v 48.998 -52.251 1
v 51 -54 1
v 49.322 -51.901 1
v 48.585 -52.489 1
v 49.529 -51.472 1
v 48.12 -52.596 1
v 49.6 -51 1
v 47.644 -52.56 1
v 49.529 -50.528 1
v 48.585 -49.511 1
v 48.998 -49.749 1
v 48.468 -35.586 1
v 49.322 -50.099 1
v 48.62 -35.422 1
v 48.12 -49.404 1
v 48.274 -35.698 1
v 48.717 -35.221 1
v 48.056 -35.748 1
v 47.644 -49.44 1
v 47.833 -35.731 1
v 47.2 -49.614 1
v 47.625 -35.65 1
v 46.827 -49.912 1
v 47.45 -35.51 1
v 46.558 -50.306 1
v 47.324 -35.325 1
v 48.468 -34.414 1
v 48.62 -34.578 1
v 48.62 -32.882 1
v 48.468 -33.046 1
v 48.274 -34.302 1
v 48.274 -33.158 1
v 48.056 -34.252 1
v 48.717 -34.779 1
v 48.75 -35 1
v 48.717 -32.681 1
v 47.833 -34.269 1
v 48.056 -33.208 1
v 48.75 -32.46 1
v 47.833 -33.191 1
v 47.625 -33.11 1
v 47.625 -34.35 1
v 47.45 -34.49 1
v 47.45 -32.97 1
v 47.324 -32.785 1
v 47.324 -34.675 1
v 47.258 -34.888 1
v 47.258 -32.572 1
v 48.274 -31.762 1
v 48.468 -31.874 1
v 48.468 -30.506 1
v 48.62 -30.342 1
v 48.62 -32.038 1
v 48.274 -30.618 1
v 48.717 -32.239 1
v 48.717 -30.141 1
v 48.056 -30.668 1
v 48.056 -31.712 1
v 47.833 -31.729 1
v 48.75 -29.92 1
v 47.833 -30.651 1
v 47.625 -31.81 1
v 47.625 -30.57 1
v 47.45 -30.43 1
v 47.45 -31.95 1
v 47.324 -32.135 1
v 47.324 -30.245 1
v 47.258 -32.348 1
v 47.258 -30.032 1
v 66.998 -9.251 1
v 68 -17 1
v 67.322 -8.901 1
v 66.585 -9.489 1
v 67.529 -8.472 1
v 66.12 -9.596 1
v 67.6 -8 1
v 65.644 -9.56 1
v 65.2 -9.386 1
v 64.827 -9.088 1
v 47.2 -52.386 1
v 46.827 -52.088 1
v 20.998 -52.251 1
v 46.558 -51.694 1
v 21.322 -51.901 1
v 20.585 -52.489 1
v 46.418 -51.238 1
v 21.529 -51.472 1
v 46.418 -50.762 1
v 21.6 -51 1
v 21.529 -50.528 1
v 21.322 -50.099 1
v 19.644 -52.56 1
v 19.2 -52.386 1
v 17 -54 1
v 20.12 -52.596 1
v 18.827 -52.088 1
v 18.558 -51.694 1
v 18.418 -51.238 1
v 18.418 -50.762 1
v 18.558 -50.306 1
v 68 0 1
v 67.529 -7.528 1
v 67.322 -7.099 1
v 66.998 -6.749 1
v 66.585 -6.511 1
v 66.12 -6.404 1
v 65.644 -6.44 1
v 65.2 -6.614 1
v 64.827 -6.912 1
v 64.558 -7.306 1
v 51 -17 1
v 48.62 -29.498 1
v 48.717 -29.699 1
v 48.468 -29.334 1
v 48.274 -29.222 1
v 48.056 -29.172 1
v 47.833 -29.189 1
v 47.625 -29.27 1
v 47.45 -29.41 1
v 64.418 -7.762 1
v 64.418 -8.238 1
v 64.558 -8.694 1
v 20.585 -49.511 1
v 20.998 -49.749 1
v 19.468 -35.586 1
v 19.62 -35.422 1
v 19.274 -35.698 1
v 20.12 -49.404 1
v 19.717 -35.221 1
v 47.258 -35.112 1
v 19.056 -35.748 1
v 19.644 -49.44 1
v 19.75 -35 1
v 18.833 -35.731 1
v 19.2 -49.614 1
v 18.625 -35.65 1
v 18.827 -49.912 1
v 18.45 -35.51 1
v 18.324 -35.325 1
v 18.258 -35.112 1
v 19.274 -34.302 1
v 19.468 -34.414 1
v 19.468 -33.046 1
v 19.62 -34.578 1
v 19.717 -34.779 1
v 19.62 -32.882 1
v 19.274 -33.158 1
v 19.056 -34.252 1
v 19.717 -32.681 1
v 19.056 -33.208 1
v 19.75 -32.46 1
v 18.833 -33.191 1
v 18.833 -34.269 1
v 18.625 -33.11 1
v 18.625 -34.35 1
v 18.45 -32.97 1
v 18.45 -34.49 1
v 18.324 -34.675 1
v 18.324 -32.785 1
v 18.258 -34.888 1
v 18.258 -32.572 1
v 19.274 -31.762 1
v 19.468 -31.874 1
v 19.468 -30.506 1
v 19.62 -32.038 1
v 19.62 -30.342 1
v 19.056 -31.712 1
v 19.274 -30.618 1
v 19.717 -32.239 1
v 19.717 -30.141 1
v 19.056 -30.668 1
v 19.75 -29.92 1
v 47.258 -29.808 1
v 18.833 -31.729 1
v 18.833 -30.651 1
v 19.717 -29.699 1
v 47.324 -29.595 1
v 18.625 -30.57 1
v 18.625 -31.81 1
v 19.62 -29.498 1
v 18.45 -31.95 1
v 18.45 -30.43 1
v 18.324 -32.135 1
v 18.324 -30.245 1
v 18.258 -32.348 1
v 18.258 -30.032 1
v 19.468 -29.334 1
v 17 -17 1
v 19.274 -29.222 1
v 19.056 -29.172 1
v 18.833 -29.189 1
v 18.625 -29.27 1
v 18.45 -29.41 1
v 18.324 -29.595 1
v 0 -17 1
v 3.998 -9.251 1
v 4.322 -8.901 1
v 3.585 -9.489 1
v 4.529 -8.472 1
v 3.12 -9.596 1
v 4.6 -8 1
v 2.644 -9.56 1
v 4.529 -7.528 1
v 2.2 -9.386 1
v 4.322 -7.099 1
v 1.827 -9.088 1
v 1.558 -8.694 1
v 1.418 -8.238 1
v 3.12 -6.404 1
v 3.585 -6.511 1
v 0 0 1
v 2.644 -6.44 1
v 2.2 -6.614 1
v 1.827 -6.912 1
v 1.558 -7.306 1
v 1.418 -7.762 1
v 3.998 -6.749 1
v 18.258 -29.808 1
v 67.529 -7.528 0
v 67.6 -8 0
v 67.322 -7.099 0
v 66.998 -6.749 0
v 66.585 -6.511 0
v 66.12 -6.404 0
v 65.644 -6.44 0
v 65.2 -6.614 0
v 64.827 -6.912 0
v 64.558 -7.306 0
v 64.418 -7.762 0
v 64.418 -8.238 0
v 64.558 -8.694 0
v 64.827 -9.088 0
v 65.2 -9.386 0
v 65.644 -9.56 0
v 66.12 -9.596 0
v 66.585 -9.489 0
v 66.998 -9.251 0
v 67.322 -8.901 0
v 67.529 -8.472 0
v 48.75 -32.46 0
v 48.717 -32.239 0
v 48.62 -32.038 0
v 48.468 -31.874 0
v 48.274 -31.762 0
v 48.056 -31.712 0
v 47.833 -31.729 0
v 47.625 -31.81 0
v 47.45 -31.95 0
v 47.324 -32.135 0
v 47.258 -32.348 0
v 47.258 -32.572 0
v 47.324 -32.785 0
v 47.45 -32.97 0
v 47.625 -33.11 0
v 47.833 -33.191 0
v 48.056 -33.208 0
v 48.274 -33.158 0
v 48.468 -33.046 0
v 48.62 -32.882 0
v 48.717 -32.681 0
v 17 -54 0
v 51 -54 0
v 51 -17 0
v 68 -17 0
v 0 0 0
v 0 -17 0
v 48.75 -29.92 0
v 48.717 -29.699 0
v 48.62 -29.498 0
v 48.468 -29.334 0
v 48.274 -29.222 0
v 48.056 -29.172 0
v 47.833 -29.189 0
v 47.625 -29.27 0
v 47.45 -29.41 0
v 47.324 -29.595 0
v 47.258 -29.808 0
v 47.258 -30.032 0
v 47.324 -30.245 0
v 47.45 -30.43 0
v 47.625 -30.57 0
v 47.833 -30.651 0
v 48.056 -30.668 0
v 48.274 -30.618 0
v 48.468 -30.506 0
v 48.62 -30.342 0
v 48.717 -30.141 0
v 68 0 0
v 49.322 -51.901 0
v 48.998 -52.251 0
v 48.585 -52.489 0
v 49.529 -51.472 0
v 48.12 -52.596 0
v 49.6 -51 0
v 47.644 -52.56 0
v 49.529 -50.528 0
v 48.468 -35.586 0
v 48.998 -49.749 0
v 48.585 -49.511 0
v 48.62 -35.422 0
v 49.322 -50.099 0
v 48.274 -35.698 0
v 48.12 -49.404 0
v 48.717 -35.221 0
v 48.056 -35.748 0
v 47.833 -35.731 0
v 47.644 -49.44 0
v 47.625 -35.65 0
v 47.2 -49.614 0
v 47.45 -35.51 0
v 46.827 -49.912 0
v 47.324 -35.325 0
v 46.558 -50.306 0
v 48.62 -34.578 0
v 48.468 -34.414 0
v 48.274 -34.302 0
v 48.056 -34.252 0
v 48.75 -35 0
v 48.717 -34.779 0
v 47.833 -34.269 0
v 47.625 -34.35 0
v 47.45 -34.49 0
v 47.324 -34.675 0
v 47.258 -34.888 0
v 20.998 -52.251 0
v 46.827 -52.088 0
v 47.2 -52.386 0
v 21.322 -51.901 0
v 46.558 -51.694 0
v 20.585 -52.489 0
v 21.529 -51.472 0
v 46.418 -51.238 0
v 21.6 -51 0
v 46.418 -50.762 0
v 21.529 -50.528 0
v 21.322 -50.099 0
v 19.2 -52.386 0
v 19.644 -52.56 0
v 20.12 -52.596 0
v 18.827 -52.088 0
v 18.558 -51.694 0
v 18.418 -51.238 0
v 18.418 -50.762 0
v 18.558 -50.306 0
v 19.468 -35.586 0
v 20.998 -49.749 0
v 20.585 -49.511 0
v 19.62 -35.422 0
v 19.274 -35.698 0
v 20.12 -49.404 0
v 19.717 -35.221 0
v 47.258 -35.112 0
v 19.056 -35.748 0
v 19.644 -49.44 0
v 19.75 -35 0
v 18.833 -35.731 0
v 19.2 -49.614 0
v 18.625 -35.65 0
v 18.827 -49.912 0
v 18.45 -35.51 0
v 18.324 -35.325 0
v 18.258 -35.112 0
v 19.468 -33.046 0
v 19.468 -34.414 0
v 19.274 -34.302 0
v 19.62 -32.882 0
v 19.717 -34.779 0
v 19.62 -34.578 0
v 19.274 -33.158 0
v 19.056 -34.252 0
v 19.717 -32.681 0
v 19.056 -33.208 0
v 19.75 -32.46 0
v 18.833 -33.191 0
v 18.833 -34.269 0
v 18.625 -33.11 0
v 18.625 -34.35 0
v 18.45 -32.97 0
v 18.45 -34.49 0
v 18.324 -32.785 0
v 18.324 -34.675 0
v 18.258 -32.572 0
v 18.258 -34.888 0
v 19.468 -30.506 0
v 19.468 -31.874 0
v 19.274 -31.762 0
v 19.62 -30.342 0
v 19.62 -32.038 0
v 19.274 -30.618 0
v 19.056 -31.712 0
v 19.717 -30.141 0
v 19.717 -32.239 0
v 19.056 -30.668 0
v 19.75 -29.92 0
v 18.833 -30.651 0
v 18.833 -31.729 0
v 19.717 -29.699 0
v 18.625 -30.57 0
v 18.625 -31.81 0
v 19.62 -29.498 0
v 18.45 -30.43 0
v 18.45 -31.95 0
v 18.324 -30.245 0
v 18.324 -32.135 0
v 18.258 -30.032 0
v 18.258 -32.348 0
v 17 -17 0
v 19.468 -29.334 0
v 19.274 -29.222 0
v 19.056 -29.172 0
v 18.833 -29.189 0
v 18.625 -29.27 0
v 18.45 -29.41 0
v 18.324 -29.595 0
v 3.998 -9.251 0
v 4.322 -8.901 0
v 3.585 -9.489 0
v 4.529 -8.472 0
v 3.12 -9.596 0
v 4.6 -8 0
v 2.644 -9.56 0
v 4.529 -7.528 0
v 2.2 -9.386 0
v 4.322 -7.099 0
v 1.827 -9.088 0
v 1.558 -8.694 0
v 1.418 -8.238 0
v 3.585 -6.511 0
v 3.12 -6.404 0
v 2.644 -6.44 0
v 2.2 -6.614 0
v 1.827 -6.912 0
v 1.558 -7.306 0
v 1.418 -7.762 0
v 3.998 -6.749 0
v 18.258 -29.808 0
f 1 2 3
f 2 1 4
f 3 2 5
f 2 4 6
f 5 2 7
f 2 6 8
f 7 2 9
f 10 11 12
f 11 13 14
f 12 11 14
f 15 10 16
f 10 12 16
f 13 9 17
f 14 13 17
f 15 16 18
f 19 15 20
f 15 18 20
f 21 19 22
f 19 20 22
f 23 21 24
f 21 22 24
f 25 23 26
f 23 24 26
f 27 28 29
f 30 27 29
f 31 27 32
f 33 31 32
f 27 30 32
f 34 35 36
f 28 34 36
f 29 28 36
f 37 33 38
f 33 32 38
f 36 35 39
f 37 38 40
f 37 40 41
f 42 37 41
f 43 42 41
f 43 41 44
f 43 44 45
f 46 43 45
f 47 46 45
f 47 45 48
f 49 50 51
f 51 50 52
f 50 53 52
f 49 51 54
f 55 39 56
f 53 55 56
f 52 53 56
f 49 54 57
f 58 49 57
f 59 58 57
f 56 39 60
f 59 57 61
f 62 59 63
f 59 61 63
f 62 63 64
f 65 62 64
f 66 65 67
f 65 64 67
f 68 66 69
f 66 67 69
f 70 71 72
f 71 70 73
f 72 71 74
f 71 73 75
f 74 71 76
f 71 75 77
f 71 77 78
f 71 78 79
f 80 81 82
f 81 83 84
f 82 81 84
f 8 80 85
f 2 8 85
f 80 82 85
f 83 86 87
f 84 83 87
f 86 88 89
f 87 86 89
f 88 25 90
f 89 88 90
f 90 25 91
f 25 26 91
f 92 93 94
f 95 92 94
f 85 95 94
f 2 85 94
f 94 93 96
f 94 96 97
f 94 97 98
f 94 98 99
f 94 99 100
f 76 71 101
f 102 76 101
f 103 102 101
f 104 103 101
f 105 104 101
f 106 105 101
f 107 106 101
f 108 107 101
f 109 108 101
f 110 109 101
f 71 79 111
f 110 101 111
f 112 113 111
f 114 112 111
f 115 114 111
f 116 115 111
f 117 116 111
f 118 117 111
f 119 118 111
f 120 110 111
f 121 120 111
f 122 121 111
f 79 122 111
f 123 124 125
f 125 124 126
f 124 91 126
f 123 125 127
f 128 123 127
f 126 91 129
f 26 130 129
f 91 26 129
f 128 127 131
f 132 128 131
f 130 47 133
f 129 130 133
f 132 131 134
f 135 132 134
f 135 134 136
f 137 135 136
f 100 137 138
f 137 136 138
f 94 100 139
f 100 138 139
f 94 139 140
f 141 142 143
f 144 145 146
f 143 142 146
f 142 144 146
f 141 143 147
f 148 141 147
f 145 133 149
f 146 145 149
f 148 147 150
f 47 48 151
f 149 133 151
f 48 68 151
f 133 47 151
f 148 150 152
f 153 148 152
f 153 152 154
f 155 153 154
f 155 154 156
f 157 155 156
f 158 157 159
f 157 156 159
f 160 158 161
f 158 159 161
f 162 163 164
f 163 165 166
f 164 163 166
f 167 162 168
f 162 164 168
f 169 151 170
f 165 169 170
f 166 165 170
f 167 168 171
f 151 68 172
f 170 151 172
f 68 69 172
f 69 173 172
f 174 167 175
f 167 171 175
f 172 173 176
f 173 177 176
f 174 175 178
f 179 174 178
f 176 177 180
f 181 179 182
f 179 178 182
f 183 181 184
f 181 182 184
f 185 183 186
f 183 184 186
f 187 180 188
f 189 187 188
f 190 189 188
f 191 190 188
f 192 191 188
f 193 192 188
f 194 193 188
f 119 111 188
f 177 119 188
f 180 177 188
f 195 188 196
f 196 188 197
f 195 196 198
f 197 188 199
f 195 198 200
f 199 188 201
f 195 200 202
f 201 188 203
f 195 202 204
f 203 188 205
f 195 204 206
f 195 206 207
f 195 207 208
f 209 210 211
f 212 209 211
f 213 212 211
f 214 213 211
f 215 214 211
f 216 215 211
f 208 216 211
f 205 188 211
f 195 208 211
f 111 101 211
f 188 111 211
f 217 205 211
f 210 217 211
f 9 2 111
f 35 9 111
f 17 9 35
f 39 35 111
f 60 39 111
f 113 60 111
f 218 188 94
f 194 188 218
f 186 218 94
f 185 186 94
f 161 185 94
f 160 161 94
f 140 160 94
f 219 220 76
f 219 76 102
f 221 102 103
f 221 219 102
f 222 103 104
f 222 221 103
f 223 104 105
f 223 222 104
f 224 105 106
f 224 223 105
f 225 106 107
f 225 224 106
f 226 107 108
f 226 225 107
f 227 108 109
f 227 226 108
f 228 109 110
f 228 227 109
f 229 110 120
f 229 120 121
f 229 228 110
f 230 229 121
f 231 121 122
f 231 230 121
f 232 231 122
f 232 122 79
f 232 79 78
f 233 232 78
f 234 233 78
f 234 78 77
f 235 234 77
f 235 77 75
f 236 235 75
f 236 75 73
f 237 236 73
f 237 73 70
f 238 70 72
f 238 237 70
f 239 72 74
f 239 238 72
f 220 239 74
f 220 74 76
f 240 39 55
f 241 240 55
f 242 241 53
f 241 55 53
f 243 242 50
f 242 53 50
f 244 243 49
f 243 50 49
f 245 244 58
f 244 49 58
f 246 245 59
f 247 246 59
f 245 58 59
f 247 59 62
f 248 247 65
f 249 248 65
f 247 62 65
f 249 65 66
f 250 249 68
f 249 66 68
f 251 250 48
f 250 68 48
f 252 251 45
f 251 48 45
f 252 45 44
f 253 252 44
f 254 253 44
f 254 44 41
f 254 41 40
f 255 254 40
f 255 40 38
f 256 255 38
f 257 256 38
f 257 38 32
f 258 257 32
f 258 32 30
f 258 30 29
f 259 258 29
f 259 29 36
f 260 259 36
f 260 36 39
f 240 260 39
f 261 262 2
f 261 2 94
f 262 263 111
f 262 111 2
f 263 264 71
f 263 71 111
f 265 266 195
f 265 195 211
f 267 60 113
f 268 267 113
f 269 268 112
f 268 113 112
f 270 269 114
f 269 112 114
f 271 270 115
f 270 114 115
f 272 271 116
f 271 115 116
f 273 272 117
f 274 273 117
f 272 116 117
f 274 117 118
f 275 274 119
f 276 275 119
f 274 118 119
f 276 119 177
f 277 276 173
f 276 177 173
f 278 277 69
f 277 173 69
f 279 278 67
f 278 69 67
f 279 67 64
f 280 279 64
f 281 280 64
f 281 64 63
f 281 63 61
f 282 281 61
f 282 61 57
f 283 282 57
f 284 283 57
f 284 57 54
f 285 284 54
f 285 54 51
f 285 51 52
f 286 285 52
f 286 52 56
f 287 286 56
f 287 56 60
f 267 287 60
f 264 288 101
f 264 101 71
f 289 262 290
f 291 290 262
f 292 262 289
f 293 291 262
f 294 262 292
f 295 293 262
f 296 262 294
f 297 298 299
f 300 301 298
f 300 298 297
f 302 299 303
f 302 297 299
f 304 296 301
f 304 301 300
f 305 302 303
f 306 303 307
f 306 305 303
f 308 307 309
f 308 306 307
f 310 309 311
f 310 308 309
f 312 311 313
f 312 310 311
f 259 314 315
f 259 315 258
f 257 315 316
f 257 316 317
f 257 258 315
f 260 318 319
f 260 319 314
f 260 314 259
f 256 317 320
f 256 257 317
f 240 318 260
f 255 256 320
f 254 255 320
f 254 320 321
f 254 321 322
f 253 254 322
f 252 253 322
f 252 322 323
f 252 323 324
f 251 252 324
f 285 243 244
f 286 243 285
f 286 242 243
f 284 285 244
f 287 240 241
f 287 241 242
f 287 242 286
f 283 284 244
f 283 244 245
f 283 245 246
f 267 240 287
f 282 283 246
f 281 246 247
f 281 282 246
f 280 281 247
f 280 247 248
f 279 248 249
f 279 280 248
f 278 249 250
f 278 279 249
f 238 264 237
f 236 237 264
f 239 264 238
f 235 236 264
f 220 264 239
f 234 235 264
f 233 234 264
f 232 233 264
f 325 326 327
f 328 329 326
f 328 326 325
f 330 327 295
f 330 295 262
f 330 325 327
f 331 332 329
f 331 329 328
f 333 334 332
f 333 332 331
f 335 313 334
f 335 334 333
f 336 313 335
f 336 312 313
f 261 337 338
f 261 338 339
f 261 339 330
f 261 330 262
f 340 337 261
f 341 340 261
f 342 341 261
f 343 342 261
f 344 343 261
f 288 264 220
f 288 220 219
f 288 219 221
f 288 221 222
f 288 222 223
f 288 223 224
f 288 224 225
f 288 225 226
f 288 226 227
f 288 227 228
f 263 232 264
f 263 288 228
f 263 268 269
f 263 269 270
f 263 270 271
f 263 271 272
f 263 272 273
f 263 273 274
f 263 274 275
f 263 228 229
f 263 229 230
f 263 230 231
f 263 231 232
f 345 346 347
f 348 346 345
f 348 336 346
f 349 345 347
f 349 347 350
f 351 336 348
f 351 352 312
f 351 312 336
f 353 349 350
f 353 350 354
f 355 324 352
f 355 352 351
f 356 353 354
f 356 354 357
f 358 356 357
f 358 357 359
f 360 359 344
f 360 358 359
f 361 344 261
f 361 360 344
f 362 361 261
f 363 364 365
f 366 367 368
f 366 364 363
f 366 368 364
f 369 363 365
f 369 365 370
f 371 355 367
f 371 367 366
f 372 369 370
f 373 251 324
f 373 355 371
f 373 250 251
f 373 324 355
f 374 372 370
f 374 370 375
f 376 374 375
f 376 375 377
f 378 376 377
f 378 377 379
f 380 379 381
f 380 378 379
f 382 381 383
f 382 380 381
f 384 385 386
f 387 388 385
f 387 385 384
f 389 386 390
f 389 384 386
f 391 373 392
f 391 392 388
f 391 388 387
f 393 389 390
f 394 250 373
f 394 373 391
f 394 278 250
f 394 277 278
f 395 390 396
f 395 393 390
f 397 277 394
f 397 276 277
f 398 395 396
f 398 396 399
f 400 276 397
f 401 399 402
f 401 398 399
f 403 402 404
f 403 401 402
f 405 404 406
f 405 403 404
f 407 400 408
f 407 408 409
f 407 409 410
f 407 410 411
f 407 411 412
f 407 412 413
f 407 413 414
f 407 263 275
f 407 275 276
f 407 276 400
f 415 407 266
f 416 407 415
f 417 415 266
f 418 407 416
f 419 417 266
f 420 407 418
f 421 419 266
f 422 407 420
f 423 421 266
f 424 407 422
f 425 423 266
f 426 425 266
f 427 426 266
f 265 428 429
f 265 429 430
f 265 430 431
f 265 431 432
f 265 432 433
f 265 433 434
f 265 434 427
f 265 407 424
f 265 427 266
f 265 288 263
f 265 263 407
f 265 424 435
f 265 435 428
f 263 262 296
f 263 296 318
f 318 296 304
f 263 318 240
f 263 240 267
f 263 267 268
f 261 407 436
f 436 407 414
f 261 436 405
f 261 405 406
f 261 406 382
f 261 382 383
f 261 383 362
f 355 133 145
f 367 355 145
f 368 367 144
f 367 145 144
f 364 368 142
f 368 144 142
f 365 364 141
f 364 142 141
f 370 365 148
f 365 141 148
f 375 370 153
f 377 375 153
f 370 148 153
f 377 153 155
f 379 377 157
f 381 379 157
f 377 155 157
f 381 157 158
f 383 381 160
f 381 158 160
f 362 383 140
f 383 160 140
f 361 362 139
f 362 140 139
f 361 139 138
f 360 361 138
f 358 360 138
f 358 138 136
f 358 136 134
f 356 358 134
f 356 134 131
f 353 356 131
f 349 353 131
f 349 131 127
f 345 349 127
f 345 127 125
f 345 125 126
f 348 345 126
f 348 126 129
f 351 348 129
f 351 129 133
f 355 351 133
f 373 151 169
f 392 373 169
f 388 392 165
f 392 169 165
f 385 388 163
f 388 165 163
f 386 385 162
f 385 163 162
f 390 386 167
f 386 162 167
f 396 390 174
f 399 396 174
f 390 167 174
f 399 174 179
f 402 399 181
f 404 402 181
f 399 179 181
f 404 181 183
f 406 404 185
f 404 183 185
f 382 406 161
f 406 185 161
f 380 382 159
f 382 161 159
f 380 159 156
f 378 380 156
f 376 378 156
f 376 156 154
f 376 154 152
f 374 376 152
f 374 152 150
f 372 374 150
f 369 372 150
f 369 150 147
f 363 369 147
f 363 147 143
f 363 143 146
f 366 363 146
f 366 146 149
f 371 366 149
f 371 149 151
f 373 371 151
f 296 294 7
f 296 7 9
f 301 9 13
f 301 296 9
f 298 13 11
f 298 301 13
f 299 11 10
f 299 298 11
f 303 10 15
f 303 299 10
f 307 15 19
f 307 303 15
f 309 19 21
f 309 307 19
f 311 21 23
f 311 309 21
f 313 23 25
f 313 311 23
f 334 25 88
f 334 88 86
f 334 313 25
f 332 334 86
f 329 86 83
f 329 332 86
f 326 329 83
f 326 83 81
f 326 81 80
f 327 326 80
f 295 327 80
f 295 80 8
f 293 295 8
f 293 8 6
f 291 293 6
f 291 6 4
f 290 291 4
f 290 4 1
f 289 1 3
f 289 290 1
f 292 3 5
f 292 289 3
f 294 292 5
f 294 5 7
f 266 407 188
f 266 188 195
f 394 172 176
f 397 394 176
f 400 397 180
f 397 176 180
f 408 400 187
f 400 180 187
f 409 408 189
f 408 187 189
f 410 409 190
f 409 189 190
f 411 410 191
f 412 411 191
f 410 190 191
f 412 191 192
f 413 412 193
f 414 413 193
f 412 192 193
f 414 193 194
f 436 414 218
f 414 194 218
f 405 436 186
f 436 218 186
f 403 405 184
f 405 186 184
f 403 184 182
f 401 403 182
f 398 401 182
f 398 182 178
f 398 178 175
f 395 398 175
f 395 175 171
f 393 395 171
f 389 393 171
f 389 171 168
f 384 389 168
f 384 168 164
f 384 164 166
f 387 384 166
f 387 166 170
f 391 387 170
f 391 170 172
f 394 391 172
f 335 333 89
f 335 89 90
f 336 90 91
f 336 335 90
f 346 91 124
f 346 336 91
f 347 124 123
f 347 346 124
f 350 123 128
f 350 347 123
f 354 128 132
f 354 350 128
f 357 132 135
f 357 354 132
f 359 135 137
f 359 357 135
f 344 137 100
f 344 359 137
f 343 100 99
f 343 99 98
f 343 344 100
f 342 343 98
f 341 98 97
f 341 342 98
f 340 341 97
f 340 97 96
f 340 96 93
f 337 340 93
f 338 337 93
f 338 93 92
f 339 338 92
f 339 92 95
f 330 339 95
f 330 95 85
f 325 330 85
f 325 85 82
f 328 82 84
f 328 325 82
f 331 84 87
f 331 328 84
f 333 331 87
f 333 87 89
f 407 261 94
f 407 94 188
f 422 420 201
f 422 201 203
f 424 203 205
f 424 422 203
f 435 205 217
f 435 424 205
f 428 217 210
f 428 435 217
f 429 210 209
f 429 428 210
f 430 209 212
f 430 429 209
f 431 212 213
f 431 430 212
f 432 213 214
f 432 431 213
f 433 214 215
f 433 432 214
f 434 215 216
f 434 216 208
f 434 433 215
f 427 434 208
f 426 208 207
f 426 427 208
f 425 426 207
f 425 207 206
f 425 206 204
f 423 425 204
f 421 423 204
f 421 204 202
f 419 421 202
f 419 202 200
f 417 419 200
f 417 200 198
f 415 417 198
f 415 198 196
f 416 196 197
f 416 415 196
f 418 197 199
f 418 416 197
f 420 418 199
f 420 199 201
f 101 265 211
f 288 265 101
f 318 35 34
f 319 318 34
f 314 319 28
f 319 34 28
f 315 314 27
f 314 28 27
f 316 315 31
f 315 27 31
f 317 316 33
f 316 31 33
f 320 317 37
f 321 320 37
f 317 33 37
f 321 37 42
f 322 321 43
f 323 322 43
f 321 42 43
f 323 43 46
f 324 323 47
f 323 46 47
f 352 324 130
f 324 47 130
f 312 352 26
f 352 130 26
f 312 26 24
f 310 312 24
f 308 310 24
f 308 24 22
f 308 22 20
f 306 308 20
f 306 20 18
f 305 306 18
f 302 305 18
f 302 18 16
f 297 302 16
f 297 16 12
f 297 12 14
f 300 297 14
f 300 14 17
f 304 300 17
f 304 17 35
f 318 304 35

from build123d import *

# Parameters (mm, degrees)
IZIM1_R                     = 1.6
Y_KSEKLIK_EKSTR_ZYON1_DEPTH = 1
IZIM2_R                     = 0.75
KES_EKSTR_ZYON1_DEPTH       = 10


with BuildPart() as part:
    # Çizim1 → Yükseklik-Ekstrüzyon1 (new body)
    with BuildSketch(Plane.XY):
        Polygon((0, 0), (68, 0), (68, -17), (51, -17), (51, -54), (17, -54), (17, -17), (0, -17), align=None)
        with Locations((3, -8)):
            Circle(IZIM1_R, mode=Mode.SUBTRACT)
        with Locations((66, -8)):
            Circle(IZIM1_R, mode=Mode.SUBTRACT)
        with Locations((20, -51)):
            Circle(IZIM1_R, mode=Mode.SUBTRACT)
        with Locations((48, -51)):
            Circle(IZIM1_R, mode=Mode.SUBTRACT)
    extrude(amount=Y_KSEKLIK_EKSTR_ZYON1_DEPTH)

    # Çizim2 → Kes-Ekstrüzyon1 (cut)
    with BuildSketch(Plane.XY.offset(1)):
        with Locations((19, -35)):
            Circle(IZIM2_R)
        with Locations((19, -32.46)):
            Circle(IZIM2_R)
        with Locations((19, -29.92)):
            Circle(IZIM2_R)
        with Locations((48, -29.92)):
            Circle(IZIM2_R)
        with Locations((48, -32.46)):
            Circle(IZIM2_R)
        with Locations((48, -35)):
            Circle(IZIM2_R)
    extrude(amount=-KES_EKSTR_ZYON1_DEPTH, mode=Mode.SUBTRACT)


solid = part.part
